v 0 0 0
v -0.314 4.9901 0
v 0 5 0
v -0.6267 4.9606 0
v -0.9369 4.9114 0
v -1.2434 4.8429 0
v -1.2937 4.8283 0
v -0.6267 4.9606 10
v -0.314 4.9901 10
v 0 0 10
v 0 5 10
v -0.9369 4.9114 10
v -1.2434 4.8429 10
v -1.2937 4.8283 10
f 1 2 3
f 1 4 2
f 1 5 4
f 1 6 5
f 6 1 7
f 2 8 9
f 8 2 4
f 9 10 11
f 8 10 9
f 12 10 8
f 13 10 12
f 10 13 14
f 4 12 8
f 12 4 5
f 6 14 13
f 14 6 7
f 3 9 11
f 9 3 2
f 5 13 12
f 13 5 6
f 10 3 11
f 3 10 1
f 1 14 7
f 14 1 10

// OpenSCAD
module wedge(height, radius, angle) {
  intersection() {
    difference() {
      cylinder(r=radius, h=height, $fn=100);
      translate([0,-radius,-1])
        cube([radius,radius*2,height+2]);
    }
    rotate([0,0,angle])
      translate([0,-radius,-1])
        cube([radius,radius*2,height+2]);
  }
}

wedge(height=10, radius=5, angle=15);
